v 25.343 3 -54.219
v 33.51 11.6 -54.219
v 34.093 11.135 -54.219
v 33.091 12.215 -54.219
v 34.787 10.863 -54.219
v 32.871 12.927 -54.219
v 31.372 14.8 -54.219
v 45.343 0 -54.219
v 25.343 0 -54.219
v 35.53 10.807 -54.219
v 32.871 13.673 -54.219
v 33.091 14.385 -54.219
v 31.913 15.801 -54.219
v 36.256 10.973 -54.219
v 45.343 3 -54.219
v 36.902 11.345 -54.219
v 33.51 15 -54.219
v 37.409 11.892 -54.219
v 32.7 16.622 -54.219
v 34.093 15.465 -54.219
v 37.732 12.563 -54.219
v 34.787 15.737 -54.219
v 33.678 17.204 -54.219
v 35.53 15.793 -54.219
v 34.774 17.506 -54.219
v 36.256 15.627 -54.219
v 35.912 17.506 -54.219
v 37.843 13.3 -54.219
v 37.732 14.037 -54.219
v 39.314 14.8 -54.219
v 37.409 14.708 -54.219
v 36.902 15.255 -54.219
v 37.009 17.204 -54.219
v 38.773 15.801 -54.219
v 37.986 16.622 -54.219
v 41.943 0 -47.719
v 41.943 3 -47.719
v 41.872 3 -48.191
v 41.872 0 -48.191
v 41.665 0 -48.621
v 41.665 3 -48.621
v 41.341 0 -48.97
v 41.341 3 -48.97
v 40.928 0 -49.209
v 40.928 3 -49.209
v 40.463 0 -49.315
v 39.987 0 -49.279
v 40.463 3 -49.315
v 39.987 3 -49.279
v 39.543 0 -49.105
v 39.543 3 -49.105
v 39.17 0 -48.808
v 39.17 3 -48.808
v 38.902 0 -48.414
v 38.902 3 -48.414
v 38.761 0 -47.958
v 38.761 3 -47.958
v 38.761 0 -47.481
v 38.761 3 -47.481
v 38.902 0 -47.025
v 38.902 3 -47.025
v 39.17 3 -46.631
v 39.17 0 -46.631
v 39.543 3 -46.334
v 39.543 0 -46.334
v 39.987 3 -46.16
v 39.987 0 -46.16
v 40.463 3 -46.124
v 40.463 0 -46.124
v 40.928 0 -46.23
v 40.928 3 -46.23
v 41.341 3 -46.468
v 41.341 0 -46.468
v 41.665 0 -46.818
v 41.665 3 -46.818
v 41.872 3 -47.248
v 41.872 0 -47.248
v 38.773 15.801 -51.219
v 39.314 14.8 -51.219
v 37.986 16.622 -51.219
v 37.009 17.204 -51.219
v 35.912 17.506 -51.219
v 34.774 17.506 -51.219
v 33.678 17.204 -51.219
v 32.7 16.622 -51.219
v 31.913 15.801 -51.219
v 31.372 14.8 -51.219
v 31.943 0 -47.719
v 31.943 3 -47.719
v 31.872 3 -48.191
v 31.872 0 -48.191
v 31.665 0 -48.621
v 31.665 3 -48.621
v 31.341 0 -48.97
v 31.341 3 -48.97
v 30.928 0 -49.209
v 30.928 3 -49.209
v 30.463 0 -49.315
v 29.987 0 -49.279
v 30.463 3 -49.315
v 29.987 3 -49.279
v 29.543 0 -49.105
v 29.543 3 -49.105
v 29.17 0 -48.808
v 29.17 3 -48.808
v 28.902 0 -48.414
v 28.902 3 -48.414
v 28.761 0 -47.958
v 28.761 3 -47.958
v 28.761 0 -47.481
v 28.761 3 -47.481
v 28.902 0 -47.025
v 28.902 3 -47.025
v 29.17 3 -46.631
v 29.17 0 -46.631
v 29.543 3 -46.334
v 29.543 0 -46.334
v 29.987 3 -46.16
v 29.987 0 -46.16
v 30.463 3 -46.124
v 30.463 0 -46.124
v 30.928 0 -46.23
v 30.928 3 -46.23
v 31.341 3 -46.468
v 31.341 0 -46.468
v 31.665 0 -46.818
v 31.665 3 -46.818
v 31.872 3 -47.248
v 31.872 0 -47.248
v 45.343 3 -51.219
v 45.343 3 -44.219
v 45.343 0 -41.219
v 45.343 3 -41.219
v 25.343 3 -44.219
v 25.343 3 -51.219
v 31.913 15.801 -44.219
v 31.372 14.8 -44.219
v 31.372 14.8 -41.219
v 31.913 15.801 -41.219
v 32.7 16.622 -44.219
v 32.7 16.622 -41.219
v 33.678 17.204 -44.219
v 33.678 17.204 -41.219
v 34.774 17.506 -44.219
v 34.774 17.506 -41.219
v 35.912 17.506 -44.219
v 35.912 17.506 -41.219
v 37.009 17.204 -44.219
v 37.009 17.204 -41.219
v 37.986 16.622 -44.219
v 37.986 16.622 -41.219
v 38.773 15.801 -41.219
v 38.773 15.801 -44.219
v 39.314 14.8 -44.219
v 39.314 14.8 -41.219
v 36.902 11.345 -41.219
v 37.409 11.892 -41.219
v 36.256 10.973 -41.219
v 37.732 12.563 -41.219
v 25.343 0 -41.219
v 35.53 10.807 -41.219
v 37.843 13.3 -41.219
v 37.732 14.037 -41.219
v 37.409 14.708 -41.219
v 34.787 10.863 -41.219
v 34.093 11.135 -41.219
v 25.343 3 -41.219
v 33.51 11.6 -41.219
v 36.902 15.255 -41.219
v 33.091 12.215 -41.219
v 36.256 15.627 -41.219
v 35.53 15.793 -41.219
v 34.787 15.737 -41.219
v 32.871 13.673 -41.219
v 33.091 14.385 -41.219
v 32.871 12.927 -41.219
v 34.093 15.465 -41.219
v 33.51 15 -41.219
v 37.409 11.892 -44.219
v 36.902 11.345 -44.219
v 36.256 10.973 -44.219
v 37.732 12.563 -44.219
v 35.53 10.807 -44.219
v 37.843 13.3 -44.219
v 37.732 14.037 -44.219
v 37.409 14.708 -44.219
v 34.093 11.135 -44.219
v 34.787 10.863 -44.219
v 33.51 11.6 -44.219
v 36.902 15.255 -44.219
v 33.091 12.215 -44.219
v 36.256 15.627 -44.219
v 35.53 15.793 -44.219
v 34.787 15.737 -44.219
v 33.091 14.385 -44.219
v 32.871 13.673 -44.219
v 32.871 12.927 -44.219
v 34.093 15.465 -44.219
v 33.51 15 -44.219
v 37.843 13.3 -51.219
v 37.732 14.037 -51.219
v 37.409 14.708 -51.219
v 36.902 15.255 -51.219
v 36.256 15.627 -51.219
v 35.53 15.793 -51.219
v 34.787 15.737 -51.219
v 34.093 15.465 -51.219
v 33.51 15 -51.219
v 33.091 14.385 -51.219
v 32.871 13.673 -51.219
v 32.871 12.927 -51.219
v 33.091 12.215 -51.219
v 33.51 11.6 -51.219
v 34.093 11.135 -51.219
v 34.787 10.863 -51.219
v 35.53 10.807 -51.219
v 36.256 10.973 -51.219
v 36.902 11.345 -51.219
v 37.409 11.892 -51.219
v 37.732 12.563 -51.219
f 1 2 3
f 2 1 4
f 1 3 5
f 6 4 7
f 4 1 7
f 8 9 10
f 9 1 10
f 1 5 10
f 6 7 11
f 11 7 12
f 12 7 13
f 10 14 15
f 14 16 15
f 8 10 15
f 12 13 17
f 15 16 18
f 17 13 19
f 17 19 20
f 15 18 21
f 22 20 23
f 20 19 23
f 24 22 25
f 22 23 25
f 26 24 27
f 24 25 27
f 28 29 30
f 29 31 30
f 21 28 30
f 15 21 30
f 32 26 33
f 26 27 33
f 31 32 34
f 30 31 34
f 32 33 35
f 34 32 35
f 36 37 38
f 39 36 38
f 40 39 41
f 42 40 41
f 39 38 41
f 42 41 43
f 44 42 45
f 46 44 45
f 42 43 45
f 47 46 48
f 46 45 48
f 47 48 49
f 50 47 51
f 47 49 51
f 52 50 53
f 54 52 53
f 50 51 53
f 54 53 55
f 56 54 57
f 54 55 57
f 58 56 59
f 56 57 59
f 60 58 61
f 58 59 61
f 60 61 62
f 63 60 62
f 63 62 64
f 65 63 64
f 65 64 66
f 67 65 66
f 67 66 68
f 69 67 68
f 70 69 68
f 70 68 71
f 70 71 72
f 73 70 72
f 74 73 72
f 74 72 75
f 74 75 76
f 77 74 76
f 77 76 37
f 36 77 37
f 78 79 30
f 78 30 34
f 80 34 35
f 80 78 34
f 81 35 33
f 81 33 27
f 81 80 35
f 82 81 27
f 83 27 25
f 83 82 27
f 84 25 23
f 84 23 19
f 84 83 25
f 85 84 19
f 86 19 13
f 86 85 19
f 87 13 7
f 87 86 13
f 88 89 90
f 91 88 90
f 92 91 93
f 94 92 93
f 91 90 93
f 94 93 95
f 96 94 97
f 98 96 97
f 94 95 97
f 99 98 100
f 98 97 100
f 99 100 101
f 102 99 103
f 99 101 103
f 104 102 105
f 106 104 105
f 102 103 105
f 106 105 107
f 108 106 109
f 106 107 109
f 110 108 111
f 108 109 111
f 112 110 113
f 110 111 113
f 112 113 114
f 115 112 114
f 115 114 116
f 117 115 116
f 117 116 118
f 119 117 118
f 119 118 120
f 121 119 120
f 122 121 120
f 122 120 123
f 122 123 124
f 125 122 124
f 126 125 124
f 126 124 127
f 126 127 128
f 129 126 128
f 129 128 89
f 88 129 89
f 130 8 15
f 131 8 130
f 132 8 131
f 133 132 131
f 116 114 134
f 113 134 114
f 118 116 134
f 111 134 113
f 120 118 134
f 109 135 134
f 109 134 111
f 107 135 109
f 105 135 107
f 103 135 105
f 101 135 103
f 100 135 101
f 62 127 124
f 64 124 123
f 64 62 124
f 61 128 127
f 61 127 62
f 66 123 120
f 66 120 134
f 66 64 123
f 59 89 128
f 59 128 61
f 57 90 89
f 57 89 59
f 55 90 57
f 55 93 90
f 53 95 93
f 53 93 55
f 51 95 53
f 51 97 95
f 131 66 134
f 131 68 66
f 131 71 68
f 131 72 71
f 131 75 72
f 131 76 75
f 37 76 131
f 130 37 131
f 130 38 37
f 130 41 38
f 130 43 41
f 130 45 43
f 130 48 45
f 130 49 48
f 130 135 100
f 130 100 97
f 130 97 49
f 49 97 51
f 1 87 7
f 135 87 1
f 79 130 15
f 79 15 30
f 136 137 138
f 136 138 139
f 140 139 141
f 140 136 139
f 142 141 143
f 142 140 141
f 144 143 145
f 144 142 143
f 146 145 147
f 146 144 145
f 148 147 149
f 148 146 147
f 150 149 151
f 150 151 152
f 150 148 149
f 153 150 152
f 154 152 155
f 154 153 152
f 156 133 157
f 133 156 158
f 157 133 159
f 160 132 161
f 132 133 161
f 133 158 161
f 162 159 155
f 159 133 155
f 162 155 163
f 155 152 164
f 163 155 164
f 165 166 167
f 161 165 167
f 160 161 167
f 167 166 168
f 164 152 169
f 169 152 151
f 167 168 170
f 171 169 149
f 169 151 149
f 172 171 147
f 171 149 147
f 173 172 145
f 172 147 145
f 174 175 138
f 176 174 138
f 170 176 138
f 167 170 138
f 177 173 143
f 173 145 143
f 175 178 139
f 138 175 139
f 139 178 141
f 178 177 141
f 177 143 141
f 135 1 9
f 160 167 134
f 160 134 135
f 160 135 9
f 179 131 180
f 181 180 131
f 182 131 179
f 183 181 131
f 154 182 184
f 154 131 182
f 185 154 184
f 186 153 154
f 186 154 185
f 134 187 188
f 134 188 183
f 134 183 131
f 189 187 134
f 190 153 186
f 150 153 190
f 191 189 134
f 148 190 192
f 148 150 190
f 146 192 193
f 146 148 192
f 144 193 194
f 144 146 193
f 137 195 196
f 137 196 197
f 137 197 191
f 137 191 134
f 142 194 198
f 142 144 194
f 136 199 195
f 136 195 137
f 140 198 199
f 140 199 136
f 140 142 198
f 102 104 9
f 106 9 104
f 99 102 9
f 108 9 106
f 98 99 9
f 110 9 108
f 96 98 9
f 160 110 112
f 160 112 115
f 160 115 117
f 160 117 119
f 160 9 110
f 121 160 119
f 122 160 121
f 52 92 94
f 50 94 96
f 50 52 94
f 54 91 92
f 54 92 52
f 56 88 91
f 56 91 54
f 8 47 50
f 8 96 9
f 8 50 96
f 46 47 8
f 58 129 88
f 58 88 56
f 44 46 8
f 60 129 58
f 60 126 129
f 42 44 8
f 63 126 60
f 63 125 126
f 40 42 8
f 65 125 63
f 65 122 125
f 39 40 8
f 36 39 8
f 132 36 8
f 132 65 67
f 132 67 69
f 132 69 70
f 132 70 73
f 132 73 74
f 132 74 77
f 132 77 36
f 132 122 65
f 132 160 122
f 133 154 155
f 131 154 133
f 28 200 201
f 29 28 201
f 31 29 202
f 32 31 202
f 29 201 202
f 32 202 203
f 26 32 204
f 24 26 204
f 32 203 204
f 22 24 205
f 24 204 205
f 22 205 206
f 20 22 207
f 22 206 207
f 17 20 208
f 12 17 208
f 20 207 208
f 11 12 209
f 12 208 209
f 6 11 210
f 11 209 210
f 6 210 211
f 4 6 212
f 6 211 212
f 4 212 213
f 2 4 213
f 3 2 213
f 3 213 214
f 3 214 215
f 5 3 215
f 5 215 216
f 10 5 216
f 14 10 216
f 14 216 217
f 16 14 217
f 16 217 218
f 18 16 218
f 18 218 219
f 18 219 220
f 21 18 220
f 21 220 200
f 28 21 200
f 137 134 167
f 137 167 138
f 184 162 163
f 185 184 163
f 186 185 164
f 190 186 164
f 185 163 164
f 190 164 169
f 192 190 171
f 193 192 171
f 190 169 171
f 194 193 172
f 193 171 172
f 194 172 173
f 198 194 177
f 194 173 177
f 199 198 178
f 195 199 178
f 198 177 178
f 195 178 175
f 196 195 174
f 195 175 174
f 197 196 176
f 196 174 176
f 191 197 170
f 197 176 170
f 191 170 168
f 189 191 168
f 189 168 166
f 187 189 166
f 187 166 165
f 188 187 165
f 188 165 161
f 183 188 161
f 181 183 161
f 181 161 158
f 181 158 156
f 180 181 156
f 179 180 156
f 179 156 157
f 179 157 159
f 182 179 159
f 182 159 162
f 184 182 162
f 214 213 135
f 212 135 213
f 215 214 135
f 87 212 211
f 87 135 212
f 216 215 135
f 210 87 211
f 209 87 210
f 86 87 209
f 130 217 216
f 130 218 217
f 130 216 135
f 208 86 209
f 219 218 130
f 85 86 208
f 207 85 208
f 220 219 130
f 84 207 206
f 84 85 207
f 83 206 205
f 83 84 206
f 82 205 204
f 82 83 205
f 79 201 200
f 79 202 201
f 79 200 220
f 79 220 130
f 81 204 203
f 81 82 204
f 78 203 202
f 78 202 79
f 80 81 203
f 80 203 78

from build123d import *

# Parameters (mm, degrees)
SKETCH_1_W                  = 20
SKETCH_1_H                  = 7
EXTRUDE_1_DEPTH             = 3
EXTRUDE_2_DEPTH             = 3
EXTRUDE_3_DEPTH             = 3
HOLE_WIZARD_3_2_3_2_1_D     = 3.2
HOLE_WIZARD_3_2_3_2_1_DEPTH = 17.544769413
HOLE_WIZARD_5_0_5_1_D       = 5
HOLE_WIZARD_5_0_5_1_DEPTH   = 3
HOLE_WIZARD_5_0_5_2_D       = 5


with BuildPart() as part:
    # 草图1 → 凸台-拉伸1 (new body)
    with BuildSketch(Plane(origin=(0, 3, 0), x_dir=(1, 0, 0), z_dir=(0, 1, 0))):
        with Locations((35.343075637, 47.719425868)):
            Rectangle(SKETCH_1_W, SKETCH_1_H)
    extrude(amount=-EXTRUDE_1_DEPTH)

    # 草图2 → 凸台-拉伸2 (add)
    with BuildSketch(Plane.XY.offset(-44.219425868)):
        with BuildLine():
            Line((45.343075637, 0), (25.343075637, 0))
            Line((25.343075637, 0), (25.343075637, 3))
            Line((25.343075637, 3), (31.372178722, 14.8))
            ThreePointArc((31.372178722, 14.8), (35.343075637, 17.544764106), (39.313972553, 14.8))
            Line((39.313972553, 14.8), (45.343075637, 3))
            Line((45.343075637, 3), (45.343075637, 0))
        make_face()
    extrude(amount=EXTRUDE_2_DEPTH)

    # 草图3 → 凸台-拉伸3 (add)
    with BuildSketch(Plane(origin=(0, 0, -51.219425868), x_dir=(-1, 0, 0), z_dir=(0, 0, -1))):
        with BuildLine():
            Line((-25.343075637, 0), (-45.343075637, 0))
            Line((-45.343075637, 0), (-45.343075637, 3))
            Line((-45.343075637, 3), (-39.313966075, 14.800005308))
            ThreePointArc((-39.313966075, 14.800005308), (-35.34306916, 17.544769413), (-31.372172244, 14.800005308))
            Line((-31.372172244, 14.800005308), (-25.343075637, 3))
            Line((-25.343075637, 3), (-25.343075637, 0))
        make_face()
    extrude(amount=EXTRUDE_3_DEPTH)

    # Ø3.2 (3.2) 直径孔1
    with Locations(Plane(origin=(0, 0, 0), x_dir=(-1, 0, 0), z_dir=(0, -1, 0))):
        with Locations((-40.343075637, 47.719425868), (-30.343075637, 47.719425868)):
            Hole(HOLE_WIZARD_3_2_3_2_1_D / 2, depth=HOLE_WIZARD_3_2_3_2_1_DEPTH)

    # Ø5.0 (5) 直径孔1
    with Locations(Plane(origin=(0, 0, -54.219425868), x_dir=(-1, 0, 0), z_dir=(0, 0, -1))):
        with Locations((-35.34306916, 13.300005308)):
            Hole(HOLE_WIZARD_5_0_5_1_D / 2, depth=HOLE_WIZARD_5_0_5_1_DEPTH)

    # Ø5.0 (5) 直径孔2 (through all)
    with Locations(Plane(origin=(0, 0, -44.219425868), x_dir=(-1, 0, 0), z_dir=(0, 0, -1))):
        with Locations((-35.34306916, 13.300005308)):
            Hole(HOLE_WIZARD_5_0_5_2_D / 2)


solid = part.part
